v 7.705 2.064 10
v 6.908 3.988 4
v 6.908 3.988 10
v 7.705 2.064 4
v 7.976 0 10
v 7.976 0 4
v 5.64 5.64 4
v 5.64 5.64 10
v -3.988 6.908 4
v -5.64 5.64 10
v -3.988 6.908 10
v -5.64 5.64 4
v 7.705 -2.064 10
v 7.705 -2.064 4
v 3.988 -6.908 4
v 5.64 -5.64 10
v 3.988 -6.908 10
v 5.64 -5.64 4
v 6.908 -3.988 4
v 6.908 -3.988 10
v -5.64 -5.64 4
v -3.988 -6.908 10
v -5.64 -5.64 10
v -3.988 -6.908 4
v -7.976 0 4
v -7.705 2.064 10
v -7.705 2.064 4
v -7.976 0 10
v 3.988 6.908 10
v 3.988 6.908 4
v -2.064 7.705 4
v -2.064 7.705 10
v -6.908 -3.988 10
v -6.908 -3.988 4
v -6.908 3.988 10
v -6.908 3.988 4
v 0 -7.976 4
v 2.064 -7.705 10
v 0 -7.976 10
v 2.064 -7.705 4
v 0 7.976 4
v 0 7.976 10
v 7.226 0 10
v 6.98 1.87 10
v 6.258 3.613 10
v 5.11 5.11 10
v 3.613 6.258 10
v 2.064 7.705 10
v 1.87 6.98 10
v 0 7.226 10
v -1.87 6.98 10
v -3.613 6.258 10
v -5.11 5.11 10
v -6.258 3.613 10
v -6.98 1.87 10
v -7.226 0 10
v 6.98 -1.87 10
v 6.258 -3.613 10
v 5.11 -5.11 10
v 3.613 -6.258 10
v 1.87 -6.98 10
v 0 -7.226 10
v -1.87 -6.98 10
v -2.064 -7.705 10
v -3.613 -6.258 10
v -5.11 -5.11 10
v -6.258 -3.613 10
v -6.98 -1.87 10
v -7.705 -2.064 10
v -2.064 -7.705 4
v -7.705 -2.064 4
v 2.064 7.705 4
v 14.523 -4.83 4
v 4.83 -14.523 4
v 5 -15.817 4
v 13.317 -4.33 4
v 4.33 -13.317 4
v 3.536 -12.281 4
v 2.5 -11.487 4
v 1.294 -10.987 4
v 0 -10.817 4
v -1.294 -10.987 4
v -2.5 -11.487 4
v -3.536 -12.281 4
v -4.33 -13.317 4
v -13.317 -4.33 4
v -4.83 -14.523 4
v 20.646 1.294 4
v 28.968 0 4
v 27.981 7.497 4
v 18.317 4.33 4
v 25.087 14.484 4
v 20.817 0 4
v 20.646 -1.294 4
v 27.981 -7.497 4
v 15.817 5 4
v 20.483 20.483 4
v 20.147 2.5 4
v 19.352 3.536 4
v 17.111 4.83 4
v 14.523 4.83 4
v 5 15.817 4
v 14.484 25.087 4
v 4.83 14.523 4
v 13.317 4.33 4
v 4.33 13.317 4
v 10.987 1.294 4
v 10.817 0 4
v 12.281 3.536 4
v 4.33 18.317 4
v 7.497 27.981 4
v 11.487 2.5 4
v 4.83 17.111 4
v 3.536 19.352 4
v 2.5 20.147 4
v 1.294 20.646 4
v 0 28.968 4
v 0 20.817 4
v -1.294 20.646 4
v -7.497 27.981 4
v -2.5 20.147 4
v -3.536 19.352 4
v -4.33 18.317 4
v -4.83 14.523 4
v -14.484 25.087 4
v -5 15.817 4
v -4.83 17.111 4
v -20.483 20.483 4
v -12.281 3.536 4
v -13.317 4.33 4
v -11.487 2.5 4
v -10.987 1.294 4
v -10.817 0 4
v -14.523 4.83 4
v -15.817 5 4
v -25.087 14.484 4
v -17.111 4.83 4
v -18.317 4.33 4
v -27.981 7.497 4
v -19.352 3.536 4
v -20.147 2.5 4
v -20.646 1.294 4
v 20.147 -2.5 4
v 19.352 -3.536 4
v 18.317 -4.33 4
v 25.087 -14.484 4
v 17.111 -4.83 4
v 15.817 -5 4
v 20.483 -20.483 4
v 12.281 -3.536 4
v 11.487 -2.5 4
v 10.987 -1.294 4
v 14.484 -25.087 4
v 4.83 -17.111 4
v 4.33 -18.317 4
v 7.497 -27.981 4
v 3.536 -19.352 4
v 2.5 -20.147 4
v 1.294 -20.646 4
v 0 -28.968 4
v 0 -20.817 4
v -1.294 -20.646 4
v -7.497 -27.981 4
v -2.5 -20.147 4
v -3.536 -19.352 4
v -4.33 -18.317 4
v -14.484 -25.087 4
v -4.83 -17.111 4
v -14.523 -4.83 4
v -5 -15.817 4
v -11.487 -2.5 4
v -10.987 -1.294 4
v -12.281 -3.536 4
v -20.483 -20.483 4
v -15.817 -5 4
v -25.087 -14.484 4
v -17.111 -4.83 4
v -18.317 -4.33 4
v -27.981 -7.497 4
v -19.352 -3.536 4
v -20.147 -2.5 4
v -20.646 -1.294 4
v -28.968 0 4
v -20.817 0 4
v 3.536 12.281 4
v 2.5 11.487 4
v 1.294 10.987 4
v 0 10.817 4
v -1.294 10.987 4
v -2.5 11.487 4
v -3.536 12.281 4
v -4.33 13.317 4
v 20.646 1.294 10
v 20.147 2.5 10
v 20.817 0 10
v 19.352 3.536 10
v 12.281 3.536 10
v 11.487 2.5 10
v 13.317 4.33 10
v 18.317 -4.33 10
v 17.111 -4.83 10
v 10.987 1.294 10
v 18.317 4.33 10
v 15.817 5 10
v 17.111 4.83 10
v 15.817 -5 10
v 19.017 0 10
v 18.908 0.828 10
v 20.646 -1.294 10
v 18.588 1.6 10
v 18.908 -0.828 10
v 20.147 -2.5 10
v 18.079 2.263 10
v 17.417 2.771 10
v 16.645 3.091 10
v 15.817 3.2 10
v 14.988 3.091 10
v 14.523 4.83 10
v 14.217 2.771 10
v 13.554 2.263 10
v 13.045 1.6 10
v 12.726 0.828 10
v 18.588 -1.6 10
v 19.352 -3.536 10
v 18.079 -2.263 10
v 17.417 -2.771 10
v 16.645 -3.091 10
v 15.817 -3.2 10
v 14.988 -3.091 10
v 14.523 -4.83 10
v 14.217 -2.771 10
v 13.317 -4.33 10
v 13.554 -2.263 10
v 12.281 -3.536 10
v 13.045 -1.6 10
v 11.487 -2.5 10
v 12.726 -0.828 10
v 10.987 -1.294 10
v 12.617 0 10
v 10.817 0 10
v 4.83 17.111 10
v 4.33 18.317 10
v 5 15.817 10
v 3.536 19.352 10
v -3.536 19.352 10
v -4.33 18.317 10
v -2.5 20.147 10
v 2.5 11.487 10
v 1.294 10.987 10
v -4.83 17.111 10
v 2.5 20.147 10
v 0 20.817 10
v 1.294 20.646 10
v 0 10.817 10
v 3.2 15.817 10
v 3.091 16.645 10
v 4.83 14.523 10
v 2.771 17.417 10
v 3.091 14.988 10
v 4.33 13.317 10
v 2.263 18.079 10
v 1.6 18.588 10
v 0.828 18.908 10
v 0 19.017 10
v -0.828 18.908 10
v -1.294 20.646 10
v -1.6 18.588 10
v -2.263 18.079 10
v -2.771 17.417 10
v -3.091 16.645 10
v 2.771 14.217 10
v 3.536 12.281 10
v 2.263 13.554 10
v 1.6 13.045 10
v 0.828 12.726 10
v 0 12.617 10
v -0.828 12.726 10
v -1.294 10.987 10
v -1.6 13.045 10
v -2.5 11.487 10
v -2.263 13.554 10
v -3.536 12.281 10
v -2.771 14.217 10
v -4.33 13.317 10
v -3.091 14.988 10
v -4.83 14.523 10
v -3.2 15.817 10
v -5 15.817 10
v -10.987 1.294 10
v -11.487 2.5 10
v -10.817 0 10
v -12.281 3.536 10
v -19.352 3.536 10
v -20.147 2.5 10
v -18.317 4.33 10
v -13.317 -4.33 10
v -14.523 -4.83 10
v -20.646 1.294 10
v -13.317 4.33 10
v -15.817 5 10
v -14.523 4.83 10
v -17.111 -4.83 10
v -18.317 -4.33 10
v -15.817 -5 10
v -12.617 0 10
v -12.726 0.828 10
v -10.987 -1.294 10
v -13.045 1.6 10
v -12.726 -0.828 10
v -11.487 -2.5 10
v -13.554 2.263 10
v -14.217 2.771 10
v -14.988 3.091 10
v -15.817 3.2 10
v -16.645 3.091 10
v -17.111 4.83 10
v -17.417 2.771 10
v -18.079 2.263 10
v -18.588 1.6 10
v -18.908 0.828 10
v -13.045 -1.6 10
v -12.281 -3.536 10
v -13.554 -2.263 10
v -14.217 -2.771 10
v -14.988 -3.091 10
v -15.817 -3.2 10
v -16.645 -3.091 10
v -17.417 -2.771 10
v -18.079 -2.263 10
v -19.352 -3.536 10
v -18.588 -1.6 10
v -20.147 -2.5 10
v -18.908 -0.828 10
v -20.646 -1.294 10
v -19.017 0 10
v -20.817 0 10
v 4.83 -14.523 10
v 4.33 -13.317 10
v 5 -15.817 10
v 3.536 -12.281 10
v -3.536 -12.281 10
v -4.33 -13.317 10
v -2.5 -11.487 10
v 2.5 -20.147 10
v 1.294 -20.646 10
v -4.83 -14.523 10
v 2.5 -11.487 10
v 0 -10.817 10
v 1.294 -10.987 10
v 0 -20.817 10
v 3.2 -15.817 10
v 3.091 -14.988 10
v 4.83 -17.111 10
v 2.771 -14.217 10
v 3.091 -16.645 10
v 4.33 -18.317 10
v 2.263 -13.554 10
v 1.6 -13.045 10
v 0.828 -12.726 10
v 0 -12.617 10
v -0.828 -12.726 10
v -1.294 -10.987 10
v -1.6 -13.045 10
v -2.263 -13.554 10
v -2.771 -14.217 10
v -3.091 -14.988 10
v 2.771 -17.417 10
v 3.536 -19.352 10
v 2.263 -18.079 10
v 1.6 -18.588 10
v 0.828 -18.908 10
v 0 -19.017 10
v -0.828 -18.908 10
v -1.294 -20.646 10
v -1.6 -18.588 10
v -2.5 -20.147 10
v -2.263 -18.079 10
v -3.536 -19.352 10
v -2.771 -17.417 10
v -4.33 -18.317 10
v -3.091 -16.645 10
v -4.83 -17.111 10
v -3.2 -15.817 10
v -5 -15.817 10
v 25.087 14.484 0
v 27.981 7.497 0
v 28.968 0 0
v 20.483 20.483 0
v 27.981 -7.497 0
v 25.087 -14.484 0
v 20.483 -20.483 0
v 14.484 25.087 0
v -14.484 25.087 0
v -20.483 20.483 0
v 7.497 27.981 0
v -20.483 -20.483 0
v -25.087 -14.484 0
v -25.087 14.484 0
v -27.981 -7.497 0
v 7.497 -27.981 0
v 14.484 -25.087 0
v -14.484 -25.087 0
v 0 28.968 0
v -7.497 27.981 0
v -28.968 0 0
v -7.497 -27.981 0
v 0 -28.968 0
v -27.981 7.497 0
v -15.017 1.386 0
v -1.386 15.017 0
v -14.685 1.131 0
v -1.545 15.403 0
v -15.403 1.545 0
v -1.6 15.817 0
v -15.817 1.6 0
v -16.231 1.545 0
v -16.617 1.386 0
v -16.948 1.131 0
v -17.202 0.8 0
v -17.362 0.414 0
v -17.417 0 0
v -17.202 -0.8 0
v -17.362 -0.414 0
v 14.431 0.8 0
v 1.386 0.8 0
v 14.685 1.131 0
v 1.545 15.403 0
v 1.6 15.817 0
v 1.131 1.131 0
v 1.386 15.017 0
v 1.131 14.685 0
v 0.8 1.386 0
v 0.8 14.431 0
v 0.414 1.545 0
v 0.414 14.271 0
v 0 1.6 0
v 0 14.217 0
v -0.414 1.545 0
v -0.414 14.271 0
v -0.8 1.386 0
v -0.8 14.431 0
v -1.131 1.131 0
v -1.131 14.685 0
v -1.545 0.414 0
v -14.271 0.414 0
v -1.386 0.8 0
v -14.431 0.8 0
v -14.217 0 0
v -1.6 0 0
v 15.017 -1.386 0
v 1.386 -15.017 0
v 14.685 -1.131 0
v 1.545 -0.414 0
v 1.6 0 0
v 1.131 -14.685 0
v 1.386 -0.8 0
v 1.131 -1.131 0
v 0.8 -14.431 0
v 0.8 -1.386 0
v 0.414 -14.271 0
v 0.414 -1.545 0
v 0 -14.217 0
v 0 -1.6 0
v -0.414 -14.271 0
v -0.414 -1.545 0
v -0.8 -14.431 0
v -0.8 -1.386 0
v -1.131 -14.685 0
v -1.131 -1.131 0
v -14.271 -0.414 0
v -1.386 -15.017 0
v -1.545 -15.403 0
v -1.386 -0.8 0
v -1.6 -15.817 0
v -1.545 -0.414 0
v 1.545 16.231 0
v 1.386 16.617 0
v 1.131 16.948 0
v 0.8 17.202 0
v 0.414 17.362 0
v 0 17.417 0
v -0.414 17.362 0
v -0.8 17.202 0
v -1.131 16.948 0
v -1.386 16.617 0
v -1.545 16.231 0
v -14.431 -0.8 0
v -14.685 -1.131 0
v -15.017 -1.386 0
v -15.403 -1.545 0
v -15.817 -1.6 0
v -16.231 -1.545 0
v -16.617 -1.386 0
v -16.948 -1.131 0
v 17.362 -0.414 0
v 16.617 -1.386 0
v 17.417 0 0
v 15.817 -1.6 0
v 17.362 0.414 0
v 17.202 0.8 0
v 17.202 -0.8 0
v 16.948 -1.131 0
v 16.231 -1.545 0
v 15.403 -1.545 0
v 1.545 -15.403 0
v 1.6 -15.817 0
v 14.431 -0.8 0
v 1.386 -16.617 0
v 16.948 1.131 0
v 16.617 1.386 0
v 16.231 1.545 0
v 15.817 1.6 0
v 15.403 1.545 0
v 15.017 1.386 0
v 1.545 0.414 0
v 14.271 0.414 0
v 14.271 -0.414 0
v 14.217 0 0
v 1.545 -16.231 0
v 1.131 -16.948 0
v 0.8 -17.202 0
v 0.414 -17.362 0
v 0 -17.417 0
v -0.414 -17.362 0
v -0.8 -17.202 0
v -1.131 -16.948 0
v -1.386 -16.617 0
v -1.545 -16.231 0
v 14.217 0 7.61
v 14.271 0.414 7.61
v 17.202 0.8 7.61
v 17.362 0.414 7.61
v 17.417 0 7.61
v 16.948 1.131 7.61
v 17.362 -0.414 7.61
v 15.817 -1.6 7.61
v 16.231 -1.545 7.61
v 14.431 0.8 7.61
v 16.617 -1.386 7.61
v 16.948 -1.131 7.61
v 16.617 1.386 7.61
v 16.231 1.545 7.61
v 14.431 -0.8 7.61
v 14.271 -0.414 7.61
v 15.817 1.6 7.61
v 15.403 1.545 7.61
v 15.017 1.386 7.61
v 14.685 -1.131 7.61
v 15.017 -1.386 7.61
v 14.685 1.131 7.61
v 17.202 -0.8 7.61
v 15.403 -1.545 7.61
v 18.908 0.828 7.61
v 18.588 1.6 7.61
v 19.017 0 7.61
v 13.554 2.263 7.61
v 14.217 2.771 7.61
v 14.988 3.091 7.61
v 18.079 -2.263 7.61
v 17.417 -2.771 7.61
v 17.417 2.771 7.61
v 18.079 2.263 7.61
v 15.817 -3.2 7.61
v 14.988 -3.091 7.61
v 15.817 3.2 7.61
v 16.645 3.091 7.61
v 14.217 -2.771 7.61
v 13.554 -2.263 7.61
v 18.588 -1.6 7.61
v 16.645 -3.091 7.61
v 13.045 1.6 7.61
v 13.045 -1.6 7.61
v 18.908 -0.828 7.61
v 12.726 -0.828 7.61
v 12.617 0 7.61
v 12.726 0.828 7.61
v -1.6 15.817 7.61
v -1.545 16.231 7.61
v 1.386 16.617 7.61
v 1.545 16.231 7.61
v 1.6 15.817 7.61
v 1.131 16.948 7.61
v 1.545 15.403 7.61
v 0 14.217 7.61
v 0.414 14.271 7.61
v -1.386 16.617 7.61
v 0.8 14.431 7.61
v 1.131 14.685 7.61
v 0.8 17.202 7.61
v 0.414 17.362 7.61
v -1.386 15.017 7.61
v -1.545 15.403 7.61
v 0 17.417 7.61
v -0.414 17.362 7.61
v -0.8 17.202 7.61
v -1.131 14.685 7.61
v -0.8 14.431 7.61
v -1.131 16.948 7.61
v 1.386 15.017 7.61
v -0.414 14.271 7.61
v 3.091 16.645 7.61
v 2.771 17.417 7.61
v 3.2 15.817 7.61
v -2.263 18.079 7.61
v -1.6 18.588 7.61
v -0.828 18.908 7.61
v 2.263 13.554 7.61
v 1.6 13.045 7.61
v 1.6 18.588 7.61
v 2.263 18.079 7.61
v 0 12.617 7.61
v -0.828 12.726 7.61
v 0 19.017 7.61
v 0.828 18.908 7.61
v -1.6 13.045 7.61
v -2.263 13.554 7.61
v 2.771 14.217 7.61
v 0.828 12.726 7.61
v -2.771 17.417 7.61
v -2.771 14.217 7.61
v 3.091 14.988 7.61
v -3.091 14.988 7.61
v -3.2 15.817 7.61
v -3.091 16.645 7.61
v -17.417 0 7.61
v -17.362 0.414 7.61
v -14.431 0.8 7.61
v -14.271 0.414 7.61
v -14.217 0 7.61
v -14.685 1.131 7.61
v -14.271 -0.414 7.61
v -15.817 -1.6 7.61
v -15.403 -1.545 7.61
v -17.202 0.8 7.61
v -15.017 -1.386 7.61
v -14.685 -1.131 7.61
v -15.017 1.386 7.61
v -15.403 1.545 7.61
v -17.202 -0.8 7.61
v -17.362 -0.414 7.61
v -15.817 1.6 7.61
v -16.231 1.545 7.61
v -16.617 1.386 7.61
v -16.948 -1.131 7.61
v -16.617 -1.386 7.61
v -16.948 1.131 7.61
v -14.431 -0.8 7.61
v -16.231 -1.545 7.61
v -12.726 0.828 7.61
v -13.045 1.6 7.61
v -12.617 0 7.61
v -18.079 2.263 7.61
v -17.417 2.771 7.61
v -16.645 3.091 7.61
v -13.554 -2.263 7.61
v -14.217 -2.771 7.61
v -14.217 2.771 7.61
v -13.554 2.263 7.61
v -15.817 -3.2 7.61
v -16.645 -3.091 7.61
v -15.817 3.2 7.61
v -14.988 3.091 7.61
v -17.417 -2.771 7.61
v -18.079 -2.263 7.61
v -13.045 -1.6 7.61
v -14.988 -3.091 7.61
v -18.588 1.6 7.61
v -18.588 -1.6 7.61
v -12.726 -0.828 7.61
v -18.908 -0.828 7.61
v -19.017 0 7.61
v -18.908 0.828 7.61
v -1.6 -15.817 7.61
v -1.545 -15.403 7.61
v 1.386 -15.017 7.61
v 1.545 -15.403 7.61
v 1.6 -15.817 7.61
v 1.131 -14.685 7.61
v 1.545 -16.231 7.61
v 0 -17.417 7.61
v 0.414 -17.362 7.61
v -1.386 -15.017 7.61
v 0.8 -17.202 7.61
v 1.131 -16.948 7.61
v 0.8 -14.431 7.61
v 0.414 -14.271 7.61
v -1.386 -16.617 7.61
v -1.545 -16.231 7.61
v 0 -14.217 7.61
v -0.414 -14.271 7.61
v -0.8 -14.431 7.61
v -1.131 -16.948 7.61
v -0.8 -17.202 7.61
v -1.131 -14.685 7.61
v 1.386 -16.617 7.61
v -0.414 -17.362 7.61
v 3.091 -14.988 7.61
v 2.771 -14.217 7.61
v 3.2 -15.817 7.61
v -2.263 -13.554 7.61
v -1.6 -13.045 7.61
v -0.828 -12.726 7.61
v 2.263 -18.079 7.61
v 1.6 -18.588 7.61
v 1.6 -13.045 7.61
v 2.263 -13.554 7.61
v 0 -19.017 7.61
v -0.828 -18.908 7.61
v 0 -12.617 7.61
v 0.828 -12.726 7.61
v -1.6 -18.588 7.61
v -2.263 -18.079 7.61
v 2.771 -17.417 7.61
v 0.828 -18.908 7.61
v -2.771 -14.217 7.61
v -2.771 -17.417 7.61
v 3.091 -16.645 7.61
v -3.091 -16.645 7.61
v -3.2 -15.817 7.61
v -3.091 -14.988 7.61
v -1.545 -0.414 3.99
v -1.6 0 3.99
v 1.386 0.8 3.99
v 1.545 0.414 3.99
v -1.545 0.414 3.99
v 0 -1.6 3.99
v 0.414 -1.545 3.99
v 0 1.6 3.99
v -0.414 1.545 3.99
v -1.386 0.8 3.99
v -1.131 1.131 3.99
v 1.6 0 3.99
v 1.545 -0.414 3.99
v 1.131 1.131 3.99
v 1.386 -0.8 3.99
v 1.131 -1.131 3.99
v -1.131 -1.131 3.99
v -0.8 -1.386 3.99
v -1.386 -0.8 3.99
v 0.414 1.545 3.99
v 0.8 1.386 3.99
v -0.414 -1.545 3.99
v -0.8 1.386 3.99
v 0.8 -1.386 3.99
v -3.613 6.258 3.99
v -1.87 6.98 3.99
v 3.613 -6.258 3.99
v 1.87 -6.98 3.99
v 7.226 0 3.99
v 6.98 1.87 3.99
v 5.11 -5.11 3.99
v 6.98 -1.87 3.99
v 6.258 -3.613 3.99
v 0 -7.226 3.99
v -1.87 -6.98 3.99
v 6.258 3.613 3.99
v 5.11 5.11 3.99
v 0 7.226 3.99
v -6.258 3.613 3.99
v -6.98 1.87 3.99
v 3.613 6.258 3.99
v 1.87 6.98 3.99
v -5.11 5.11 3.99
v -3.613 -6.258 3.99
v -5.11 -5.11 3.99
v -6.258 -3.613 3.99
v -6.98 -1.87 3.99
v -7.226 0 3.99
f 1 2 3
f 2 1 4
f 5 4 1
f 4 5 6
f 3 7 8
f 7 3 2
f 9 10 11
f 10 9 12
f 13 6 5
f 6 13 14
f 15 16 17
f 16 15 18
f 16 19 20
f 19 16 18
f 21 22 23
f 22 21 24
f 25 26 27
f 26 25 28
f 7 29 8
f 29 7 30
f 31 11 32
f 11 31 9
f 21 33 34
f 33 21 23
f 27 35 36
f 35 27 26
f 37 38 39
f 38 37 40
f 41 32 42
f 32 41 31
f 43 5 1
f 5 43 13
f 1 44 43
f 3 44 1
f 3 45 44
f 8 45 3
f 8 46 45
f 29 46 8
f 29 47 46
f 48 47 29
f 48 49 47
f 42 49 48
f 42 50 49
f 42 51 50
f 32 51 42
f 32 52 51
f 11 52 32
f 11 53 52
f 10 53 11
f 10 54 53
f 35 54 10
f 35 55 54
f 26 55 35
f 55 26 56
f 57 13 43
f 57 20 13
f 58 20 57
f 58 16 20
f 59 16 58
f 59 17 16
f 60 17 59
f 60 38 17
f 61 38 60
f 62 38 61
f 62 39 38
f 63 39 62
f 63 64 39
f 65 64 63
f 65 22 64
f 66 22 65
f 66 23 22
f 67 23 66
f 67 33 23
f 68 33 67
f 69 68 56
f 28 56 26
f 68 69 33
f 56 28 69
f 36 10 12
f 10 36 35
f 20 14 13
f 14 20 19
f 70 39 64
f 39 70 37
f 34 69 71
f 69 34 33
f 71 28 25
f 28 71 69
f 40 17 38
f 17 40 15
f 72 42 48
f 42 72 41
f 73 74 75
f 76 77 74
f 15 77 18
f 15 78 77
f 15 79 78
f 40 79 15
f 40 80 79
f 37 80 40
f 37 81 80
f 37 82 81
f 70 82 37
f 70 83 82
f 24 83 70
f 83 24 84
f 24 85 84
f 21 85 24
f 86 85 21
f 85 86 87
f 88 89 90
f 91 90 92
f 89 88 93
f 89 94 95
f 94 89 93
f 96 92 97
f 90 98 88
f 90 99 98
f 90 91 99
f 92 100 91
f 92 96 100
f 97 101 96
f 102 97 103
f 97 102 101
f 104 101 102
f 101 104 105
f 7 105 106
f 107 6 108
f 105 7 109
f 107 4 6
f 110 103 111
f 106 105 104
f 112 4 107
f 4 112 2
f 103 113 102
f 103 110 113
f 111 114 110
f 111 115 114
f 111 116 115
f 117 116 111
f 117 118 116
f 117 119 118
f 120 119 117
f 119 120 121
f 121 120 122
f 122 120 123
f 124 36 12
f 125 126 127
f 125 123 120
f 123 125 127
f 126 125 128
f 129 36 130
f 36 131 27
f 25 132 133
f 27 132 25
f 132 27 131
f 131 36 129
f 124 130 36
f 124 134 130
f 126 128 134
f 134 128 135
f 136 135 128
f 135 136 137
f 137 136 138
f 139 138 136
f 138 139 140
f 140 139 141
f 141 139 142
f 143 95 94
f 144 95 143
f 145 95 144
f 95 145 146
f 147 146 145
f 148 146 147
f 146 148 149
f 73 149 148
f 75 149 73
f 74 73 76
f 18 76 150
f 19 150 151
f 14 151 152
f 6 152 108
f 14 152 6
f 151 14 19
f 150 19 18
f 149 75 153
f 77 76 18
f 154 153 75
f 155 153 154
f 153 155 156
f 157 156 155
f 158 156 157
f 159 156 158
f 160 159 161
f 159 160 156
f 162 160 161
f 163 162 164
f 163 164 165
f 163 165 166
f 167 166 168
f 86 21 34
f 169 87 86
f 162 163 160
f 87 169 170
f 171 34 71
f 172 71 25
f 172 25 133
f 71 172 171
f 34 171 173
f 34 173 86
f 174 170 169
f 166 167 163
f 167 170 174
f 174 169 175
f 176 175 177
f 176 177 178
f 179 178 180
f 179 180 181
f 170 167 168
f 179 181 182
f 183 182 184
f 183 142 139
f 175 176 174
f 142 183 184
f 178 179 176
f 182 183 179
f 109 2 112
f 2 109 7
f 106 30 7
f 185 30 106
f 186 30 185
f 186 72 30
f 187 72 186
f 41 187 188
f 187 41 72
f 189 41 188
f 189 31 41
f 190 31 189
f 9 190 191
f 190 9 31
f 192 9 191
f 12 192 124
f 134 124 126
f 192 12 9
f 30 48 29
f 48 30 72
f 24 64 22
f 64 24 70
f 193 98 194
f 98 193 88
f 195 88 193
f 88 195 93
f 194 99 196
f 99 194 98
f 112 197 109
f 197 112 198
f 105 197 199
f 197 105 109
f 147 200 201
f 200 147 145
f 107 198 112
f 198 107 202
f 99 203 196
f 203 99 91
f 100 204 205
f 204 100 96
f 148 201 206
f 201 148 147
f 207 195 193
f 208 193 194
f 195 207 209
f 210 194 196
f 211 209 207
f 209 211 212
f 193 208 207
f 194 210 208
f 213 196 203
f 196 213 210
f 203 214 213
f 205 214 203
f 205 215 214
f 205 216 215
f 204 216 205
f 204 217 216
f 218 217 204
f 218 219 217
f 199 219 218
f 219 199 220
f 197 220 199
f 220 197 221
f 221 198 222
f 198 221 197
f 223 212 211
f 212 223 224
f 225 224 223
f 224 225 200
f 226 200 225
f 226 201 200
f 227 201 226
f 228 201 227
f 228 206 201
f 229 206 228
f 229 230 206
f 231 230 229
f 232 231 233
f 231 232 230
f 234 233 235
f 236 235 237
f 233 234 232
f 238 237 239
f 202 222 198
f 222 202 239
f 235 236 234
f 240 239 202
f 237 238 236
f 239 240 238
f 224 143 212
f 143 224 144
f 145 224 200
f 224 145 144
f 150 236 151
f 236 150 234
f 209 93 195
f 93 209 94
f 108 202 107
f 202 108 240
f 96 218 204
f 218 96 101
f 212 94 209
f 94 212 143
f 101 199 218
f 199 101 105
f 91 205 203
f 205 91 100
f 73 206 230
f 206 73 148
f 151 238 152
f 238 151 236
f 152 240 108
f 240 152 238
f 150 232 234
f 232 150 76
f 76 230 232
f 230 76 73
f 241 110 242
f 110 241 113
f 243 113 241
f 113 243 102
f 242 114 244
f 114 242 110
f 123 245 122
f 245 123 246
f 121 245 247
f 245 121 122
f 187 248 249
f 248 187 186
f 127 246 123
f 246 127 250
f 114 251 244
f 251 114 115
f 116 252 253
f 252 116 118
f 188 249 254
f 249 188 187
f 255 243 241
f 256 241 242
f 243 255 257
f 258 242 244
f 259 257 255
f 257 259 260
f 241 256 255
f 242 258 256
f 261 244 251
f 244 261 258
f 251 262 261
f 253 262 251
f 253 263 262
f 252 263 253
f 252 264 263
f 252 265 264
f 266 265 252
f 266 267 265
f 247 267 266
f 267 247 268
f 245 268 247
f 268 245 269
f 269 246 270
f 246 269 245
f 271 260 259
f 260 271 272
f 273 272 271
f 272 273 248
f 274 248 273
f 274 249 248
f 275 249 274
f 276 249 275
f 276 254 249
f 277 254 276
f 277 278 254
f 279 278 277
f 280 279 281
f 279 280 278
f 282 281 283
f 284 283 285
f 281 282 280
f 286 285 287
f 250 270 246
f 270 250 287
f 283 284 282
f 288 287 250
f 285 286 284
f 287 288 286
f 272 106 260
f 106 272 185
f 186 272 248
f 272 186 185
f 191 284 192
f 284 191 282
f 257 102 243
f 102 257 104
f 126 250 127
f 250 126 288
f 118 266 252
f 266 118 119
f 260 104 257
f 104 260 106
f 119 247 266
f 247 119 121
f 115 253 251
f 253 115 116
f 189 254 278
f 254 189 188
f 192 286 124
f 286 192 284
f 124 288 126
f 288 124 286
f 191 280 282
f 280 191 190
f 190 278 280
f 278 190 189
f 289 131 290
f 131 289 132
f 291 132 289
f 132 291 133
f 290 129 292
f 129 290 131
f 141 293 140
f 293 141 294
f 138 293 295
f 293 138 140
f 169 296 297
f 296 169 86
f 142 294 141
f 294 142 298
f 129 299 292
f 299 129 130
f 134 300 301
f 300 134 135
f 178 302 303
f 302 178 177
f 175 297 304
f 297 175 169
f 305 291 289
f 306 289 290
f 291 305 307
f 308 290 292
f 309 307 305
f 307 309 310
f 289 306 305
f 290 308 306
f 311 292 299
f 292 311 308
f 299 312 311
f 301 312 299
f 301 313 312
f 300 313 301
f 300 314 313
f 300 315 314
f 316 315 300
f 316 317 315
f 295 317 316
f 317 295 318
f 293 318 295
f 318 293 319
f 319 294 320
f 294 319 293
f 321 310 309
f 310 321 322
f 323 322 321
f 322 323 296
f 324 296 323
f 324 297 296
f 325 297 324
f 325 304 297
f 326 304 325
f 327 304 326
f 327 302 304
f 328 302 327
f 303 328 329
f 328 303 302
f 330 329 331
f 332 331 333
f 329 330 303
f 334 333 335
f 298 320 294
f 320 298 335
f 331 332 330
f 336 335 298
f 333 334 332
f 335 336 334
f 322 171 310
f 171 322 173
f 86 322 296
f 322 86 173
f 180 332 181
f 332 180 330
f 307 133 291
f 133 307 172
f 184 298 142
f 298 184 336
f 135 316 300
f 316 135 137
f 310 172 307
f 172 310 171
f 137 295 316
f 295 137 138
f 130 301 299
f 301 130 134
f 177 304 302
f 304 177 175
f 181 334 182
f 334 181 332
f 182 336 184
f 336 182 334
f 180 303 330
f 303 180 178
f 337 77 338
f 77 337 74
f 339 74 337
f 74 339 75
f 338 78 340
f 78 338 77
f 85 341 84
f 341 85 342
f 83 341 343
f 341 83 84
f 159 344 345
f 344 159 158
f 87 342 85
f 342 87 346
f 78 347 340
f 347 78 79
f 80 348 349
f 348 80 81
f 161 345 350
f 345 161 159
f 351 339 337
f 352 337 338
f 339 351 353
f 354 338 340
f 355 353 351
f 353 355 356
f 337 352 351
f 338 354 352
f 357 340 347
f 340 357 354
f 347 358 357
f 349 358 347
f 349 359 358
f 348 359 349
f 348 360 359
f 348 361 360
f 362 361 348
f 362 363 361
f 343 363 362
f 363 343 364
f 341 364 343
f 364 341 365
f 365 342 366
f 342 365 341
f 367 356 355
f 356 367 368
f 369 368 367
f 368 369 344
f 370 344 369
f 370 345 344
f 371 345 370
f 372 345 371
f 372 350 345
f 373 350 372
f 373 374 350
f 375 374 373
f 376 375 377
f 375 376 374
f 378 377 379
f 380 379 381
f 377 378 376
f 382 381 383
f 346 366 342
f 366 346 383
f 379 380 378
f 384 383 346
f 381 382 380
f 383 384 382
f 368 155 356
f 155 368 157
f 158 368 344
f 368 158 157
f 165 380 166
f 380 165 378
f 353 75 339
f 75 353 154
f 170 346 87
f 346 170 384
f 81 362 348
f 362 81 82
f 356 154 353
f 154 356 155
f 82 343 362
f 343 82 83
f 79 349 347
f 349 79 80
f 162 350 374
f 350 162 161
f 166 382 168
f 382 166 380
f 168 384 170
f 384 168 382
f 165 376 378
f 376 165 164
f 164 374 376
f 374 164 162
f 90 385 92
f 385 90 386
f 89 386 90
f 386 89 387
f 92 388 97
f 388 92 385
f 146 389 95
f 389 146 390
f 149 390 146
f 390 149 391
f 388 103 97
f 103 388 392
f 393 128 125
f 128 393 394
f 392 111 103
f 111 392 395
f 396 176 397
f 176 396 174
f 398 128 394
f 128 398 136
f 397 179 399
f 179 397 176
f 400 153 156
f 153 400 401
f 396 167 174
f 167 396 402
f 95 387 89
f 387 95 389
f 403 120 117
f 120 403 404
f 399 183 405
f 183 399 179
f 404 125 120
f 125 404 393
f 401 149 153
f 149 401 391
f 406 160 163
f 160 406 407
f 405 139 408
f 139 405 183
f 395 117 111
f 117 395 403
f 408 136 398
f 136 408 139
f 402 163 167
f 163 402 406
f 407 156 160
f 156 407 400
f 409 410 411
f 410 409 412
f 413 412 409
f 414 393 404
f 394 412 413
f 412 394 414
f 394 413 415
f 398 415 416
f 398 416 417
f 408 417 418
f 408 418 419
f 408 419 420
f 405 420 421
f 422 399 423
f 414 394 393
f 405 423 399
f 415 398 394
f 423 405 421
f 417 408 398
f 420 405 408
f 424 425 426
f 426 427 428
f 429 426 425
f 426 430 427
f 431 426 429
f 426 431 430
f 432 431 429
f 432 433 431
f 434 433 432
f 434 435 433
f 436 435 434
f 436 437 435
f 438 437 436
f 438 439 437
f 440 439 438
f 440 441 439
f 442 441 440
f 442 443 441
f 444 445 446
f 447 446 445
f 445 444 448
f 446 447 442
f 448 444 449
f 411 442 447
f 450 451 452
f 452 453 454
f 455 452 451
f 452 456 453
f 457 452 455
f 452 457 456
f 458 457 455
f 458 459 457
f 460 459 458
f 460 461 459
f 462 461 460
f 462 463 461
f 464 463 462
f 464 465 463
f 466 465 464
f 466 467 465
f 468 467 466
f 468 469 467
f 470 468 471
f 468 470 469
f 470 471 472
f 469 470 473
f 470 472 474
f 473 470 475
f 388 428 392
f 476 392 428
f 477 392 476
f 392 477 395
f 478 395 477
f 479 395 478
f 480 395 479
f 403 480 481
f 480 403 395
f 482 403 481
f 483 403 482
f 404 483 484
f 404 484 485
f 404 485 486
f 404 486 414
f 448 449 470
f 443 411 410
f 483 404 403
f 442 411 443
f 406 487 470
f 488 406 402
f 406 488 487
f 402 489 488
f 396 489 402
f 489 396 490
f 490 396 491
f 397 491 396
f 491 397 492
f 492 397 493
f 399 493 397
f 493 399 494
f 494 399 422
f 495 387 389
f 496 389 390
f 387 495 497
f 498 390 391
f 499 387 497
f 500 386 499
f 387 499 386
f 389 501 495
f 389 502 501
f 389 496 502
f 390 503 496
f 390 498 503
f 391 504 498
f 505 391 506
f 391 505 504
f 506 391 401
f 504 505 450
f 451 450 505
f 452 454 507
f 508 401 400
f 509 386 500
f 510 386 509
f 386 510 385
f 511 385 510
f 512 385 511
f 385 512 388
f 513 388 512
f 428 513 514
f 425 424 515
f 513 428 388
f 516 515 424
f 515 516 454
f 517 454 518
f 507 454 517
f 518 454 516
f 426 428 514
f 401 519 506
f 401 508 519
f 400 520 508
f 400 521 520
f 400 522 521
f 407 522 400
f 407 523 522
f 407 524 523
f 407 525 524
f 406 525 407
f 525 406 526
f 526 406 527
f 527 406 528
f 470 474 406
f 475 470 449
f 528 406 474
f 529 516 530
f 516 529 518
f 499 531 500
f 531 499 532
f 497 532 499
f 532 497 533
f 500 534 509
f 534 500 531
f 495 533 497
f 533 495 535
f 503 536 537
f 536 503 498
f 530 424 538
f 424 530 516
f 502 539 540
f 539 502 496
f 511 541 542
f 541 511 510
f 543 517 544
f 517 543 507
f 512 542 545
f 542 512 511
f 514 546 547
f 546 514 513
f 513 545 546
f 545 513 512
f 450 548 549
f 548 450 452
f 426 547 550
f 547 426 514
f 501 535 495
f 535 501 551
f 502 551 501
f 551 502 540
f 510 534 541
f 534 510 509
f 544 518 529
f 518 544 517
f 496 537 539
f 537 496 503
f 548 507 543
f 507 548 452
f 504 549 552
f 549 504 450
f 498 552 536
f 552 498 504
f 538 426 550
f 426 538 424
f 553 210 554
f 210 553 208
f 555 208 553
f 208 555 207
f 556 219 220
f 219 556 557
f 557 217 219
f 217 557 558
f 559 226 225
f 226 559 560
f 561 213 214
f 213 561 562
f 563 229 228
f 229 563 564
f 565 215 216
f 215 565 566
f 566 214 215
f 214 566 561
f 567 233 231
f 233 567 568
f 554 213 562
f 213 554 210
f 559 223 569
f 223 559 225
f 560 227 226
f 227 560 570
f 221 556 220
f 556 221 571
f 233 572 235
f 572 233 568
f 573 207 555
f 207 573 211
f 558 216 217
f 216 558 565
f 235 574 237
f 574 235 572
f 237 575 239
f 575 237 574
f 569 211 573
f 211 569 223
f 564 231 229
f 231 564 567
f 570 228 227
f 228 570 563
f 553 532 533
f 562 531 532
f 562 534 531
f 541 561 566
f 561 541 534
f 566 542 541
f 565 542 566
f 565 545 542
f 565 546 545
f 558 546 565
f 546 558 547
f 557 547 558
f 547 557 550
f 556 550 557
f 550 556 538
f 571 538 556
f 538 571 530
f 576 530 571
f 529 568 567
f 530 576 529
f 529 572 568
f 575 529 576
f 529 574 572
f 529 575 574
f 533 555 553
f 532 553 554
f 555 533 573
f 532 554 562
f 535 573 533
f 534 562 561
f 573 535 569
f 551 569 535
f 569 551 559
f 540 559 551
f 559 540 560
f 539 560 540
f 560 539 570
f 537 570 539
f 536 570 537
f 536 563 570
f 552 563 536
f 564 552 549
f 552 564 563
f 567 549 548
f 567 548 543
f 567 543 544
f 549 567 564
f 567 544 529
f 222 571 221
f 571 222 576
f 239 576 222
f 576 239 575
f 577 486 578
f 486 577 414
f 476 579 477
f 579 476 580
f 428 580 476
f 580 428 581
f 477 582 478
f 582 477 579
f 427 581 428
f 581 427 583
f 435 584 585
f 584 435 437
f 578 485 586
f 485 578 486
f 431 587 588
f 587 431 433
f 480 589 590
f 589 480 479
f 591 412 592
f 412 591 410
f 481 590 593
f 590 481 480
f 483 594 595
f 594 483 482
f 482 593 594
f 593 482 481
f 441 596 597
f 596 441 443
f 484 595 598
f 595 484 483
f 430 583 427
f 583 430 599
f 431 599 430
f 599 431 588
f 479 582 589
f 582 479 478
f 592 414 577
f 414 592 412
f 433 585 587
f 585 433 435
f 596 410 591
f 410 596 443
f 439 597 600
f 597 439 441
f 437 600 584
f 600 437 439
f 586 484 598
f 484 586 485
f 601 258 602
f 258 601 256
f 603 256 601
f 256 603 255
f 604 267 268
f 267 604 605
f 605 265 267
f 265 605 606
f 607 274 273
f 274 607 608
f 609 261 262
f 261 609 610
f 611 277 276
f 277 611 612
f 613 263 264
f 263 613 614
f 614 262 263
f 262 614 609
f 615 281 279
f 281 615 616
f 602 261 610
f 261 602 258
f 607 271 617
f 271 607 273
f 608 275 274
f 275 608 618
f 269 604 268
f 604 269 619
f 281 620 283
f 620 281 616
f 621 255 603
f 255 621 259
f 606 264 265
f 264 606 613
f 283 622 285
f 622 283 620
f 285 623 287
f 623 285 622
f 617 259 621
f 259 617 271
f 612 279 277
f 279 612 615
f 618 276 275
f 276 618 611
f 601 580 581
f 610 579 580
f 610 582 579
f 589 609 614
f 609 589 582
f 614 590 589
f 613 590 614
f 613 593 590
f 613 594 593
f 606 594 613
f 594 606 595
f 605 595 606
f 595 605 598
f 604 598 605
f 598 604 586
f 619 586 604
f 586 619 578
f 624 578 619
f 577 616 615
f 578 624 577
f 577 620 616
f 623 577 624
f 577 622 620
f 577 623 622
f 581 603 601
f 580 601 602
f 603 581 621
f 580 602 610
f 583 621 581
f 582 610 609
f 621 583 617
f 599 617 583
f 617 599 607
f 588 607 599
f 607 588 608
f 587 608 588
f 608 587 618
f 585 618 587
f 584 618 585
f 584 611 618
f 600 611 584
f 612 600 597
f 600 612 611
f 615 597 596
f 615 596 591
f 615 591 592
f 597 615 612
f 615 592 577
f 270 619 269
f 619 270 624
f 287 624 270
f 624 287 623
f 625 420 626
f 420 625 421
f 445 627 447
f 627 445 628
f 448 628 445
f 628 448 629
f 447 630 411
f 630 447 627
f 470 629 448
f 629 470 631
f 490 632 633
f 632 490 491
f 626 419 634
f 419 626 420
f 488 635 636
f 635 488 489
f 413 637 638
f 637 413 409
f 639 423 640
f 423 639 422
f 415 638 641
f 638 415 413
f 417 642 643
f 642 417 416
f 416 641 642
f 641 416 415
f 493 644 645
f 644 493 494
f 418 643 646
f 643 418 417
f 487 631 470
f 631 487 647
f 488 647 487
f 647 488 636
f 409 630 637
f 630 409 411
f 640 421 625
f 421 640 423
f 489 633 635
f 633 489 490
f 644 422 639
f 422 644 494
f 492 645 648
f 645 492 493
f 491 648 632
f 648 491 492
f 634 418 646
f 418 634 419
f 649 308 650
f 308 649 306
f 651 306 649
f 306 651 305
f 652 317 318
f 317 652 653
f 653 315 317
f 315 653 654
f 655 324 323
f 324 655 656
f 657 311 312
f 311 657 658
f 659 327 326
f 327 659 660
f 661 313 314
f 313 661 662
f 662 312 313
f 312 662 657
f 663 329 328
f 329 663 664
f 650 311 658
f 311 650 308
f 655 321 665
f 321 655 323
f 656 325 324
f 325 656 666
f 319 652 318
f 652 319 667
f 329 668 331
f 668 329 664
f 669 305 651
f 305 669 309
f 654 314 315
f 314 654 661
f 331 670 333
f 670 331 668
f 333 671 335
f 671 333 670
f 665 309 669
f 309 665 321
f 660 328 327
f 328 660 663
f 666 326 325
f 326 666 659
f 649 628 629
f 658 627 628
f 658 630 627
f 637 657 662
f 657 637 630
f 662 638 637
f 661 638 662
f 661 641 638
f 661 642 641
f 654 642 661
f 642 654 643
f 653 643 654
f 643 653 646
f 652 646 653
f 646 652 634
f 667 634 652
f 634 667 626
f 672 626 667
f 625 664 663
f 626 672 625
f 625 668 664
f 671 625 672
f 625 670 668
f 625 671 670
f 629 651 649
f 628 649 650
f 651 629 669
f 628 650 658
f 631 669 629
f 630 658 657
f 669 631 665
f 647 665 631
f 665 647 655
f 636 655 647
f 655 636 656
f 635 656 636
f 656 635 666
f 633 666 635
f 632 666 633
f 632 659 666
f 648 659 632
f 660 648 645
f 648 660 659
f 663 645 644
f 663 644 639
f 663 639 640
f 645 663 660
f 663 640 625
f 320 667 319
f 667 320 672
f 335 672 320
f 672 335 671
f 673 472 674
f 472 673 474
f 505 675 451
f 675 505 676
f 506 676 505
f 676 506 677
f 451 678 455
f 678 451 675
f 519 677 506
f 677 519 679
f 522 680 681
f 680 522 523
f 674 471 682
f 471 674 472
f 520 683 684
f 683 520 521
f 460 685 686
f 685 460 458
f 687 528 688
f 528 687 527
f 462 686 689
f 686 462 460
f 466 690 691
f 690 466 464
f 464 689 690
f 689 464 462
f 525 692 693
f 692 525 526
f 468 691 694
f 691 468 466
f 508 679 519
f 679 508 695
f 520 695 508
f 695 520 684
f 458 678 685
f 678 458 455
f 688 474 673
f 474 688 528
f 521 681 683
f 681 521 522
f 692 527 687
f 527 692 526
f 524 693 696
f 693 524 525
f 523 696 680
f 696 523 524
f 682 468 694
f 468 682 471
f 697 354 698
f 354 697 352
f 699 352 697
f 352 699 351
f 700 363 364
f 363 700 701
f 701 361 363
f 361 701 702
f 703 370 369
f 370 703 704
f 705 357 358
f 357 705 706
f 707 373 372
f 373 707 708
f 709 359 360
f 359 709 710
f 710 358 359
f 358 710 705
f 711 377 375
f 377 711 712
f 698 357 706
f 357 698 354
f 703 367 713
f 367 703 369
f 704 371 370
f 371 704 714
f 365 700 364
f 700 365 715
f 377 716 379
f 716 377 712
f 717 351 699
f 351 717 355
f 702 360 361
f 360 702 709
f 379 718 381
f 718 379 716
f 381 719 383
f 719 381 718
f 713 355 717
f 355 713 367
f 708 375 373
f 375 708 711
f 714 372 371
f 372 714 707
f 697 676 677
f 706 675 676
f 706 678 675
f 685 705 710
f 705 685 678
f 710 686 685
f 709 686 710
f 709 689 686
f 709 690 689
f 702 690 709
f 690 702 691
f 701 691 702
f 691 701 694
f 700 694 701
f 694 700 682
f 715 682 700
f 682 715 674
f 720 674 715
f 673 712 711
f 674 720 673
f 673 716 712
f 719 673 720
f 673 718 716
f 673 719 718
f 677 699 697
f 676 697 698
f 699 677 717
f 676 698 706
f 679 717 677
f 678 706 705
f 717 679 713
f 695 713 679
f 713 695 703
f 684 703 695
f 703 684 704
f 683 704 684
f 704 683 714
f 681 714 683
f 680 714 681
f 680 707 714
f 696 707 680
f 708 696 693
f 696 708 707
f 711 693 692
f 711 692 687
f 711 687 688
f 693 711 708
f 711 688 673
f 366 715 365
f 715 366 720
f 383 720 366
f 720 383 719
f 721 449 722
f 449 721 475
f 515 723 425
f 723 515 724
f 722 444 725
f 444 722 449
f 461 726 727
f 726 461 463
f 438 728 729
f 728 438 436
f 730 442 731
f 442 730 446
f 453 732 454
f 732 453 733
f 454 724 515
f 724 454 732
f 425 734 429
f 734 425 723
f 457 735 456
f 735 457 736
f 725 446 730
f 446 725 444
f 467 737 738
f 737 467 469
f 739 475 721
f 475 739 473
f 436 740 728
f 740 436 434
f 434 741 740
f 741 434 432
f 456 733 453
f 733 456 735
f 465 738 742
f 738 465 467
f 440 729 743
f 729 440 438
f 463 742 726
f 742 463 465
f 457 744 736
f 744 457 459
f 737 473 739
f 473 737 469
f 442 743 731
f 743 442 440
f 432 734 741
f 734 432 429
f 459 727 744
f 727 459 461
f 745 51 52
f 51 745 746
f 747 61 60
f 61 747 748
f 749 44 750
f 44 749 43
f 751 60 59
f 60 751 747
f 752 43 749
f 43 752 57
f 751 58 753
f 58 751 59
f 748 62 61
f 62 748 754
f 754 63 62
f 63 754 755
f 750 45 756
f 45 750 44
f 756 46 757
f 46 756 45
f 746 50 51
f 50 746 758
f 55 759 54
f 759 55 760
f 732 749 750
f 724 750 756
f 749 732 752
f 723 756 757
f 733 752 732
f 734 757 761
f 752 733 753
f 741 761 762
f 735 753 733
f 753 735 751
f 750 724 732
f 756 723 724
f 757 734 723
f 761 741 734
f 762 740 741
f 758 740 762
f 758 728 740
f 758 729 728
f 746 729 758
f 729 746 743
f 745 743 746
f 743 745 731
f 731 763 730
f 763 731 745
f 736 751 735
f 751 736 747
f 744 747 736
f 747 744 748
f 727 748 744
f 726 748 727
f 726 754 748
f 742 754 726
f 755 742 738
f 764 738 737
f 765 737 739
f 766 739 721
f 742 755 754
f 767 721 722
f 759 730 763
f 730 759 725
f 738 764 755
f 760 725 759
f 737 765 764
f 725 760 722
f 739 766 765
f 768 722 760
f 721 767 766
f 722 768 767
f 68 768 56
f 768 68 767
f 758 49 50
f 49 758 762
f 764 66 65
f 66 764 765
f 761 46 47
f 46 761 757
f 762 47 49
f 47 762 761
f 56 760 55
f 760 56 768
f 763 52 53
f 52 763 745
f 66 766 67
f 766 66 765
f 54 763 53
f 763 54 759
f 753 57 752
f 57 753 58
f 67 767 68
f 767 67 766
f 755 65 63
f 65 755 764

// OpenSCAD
//====================================================
// Печатная оснастка для геликальной антенны (спираль не выводится)
// DEV версия v14
//====================================================
// Задача: печатные детали для сборки axial-mode геликальной антенны:
// - Труба для намотки (опционально канавка-ориентир; спираль не печатается)
// - Шаблон для сверления/резки рефлектора (опционально)
// - Крепёж из 2 деталей: (A) площадка под трубу с кольцом и стойками, (B) крепление к плоскости с 4 ушами
// - Посадка под SMA на квадратной площадке со стороны рефлектора
// - Опциональный кондуктор для гибки дельта-матча (сам дельта-матч — проволока)
//
// Единицы: миллиметры
//====================================================

/* [Быстрый экспорт] */
export_part = "plate"; // [assembly,tube,tube_section,plate,wall_mount,reflector_template,delta_jig] (что вывести/экспортировать)

/* [РЧ параметры] */
freq_mhz = 5800;          // Рабочая частота (МГц)
target_gain_dbi = 12;     // Только для расчёта длины трубы (спираль не выводится)
polarization = "RHCP";    // [RHCP,LHCP] (ориентир: RHCP/LHCP)

/* [Геометрия спирали (только для расчёта трубы)] */
circumference_factor = 1.00;  // C ≈ 1.0*λ (старт для axial-mode)
pitch_factor = 0.25;          // S ≈ 0.25*λ (старт для axial-mode)
min_turns = 5.5;
max_turns = 14;

/* [Проволока и согласование (дельта-матч)] */
wire_d = 1.2;                 // Диаметр проволоки (мм)
wire_material = "CuAlloy";    // [CuAlloy,Brass,Al] (потери разные; геометрия важнее для согласования)
delta_mode = "auto";          // [auto,manual] auto=авторасчёт, manual=вручную
delta_base_manual = 0;        // мм (0 = игнорировать)
delta_height_manual = 0;      // мм (0 = игнорировать)
delta_tap_manual = 0;         // мм от "заземлённого" конца по стороне треугольника (0 = игнорировать)

/* [Труба намотки] */
tube_wall = 2.0;              // mm
tube_clearance = 0.25;        // мм (посадка на кольцо)
tube_groove_enable = true;    // делать направляющую канавку (для ровной укладки проволоки)

groove_segments_per_turn = 24; // Кол-во сегментов канавки на один виток (выше = ровнее, но медленнее)

tube_groove_depth = 0.5;      // мм (глубина канавки в трубе)
tube_groove_width = 1.2;      // mm
tube_sections = 3;            // кол-во секций трубы для печати
tube_section_gap = 0.25;      // мм зазор между секциями (допуск сборки)
export_section = 0;           // какую секцию экспортировать при export_part="tube_section"

/* [Площадка под трубу (деталь A)] */
plate_thickness = 4.0;        // mm
plate_od_extra = 14;          // мм запас за край рефлектора для прочности
spigot_height = 6.0;          // mm
standoff_count = 4;
standoff_d = 10.0;            // мм (наружный диаметр)
standoff_h = 6.0;             // мм (высота над площадкой)
clamp_screw_d = 3.2;          // мм проход под M3 (поменяй под свой крепёж)
clamp_screw_head_d = 6.4;     // опциональная выборка под шляпку
clamp_screw_head_h = 2.4;

/* [Крепление к плоскости (деталь B)] */
wall_block_thickness = 5.0;   // мм (по твоему ТЗ)
wall_block_xy = 28;           // мм габарит опорного блока (примерно квадрат)
lug_length = 10;              // mm
lug_width = 10;               // mm
lug_hole_d = 5.0;             // мм (по твоему ТЗ)
lug_pair_gap = 10;            // мм расстояние между двумя ушами на одной стороне

/* [Шаблон рефлектора] */
reflector_mode = "auto";      // [auto,manual] auto=авто, manual=вручную
reflector_d_manual = 120;     // мм если manual
reflector_thickness_template = 1.0;  // мм (только шаблон; реальный рефлектор обычно из металла)

/* [Разъём SMA на площадке] */
// Твой SMA: квадрат ~12.6 мм, отверстия по углам ~8 мм (центр-центр) ~8mm (center-to-center)
sma_flange_side = 12.6;       // мм (сторона квадратной площадки)
sma_hole_spacing = 8.0;       // mm (center-to-center)
sma_flange_hole_d = 2.4;      // мм (под винтики разъёма)
sma_center_hole_d = 6.6;      // мм (отверстие под тело разъёма)
sma_offset_r = 0;             // мм смещение от центра (0 = по центру)

/* [Качество рендера] */
preview_mode = true;         // Быстрый режим для превью (резко ускоряет первый рендер)
render_preset = "normal";    // [fast,normal,pretty] fast=быстро, normal=нормально, pretty=красиво

// Внутренняя настройка качества (не трогай, если не нужно)
$fn = (preview_mode || render_preset=="fast") ? 24 :
      (render_preset=="pretty" ? 96 : 48);


//====================================================
// Derived values
//====================================================
function clamp(x, a, b) = x < a ? a : (x > b ? b : x);

// Speed of light (mm/s)
c_mm_s = 299792458000;
freq_hz = freq_mhz * 1e6;
lambda_mm = c_mm_s / freq_hz;

// Axial-mode starting values (tube sizing only)
circ_mm = lambda_mm * circumference_factor;
tube_od = circ_mm / PI;
pitch_mm = lambda_mm * pitch_factor;

// Tube length sizing by gain rule-of-thumb
turns_raw = pow(10, (target_gain_dbi - 5.4)/10);
turns = clamp(turns_raw, min_turns, max_turns);
tube_len = turns * pitch_mm;

// Reflector diameter (auto start)
reflector_d_auto = lambda_mm * 0.85;
reflector_d = (reflector_mode == "manual") ? reflector_d_manual : reflector_d_auto;

// Plate OD: slightly larger than reflector
plate_od = reflector_d + plate_od_extra;

// Spigot geometry: tube slips OVER spigot
tube_id = tube_od - 2*tube_wall;
spigot_od = tube_id - 2*tube_clearance;
spigot_id = max(0.1, spigot_od - 2.4);

// Standoff circle radius
standoff_r = (reflector_d/2) * 0.72;

//====================================================
// Delta-match "auto" starting geometry
//====================================================
// Starting point (empirical): base ~0.18λ, height ~0.10λ, tap ~45% of height.
// Material mostly affects loss (Q); geometry dominates match.
// Expect tuning in the real build.
mat_k = (wire_material == "Brass") ? 0.995 : (wire_material == "Al") ? 0.990 : 1.000;
wd_k = 1.0 - clamp((wire_d - 1.0) * 0.002, -0.02, 0.02);

delta_base_auto = lambda_mm * 0.18 * mat_k * wd_k;
delta_height_auto = lambda_mm * 0.10 * mat_k * wd_k;
delta_tap_auto = delta_height_auto * 0.45;

delta_base = (delta_mode == "manual" && delta_base_manual > 0) ? delta_base_manual : delta_base_auto;
delta_height = (delta_mode == "manual" && delta_height_manual > 0) ? delta_height_manual : delta_height_auto;
delta_tap = (delta_mode == "manual" && delta_tap_manual > 0) ? delta_tap_manual : delta_tap_auto;

// Print computed values in OpenSCAD console
echo("==== Helical Antenna v13 (mechanical parts only) ====");
echo("freq_mhz=", freq_mhz, " lambda_mm=", lambda_mm);
echo("tube_od(mm)=", tube_od, " tube_len(mm)=", tube_len, " pitch(mm)=", pitch_mm, " turns=", turns);
echo("reflector_d(mm)=", reflector_d);
echo("Delta-match (start) base(mm)=", delta_base, " height(mm)=", delta_height, " tap(mm)=", delta_tap);
echo("Polarization=", polarization);

//====================================================
// Modules
//====================================================

module drill_hole(d, h, cbore_d=0, cbore_h=0) {
    cylinder(d=d, h=h, center=false);
    if (cbore_d > 0 && cbore_h > 0)
        translate([0,0,h-cbore_h]) cylinder(d=cbore_d, h=cbore_h, center=false);
}


// Быстрый "стержень" между двумя точками (для канавки). Нам достаточно цилиндра.
module rod_between(p0, p1, d) {
    v = [p1[0]-p0[0], p1[1]-p0[1], p1[2]-p0[2]];
    h = norm(v);
    if (h > 0) {
        // Ось Z -> вектор v (быстро, без hull/sphere)
        ax = cross([0,0,1], v);
        axn = norm(ax);
        ang = acos(v[2] / h);

        translate(p0) {
            if (axn < 1e-9) {
                cylinder(d=d, h=h, center=false);
            } else {
                rotate(a=ang, v=ax) cylinder(d=d, h=h, center=false);
            }
        }
    }
}

module sma_flange_holes(th) {
    for (sx=[-1,1], sy=[-1,1]) {
        translate([sx*sma_hole_spacing/2, sy*sma_hole_spacing/2, 0])
            cylinder(d=sma_flange_hole_d, h=th, center=false);
    }
}

module sma_center_hole(th) {
    cylinder(d=sma_center_hole_d, h=th, center=false);
}

module plate_part() {
    // Part A: plate + spigot + standoffs
    difference() {
        union() {
            cylinder(d=plate_od, h=plate_thickness);

            translate([0,0,plate_thickness])
                difference() {
                    cylinder(d=spigot_od + 4.0, h=spigot_height);
                    translate([0,0,-0.01]) cylinder(d=spigot_od, h=spigot_height+0.02);
                }

            for (i=[0:standoff_count-1]) {
                ang = 360*i/standoff_count;
                translate([standoff_r*cos(ang), standoff_r*sin(ang), plate_thickness])
                    cylinder(d=standoff_d, h=standoff_h);
            }
        }

        // Central clamp screw
        translate([0,0,-0.01])
            cylinder(d=clamp_screw_d, h=plate_thickness+spigot_height+standoff_h+0.02);

        // Clamp holes in standoffs
        for (i=[0:standoff_count-1]) {
            ang = 360*i/standoff_count;
            translate([standoff_r*cos(ang), standoff_r*sin(ang), -0.01])
                drill_hole(clamp_screw_d, plate_thickness+standoff_h+0.02, clamp_screw_head_d, clamp_screw_head_h);
        }

        // Tube inner clearance
        translate([0,0,plate_thickness-0.01])
            cylinder(d=tube_id + 2.0, h=spigot_height+standoff_h+0.02);
    }
}

module wall_mount_part() {
    // Part B: wall/plane mount block with 4 lugs (Ø5 holes) + clamp holes aligned to standoffs
    difference() {
        union() {
            translate([-wall_block_xy/2, -wall_block_xy/2, 0])
                cube([wall_block_xy, wall_block_xy, wall_block_thickness]);

            // Two lugs on +Y side
            for (k=[-1,1]) {
                translate([k*(lug_pair_gap/2), wall_block_xy/2, 0])
                    translate([-lug_width/2, 0, 0])
                        cube([lug_width, lug_length, wall_block_thickness]);
            }
            // Two lugs on -Y side
            for (k=[-1,1]) {
                translate([k*(lug_pair_gap/2), -wall_block_xy/2 - lug_length, 0])
                    translate([-lug_width/2, 0, 0])
                        cube([lug_width, lug_length, wall_block_thickness]);
            }
        }

        // Four Ø5 through-holes in lugs
        for (side=[1,-1]) for (k=[-1,1]) {
            y0 = (side==1) ? (wall_block_xy/2 + lug_length/2) : (-wall_block_xy/2 - lug_length/2);
            translate([k*(lug_pair_gap/2), y0, -0.01])
                cylinder(d=lug_hole_d, h=wall_block_thickness+0.02);
        }

        // Clamp-screw clearance holes aligned with plate standoffs
        for (i=[0:standoff_count-1]) {
            ang = 360*i/standoff_count;
            translate([standoff_r*cos(ang), standoff_r*sin(ang), -0.01])
                cylinder(d=clamp_screw_d, h=wall_block_thickness+0.02);
        }

        // Central clamp screw
        translate([0,0,-0.01])
            cylinder(d=clamp_screw_d, h=wall_block_thickness+0.02);
    }
}

module reflector_template() {
    // Optional: printable drilling/cutting template for your metal reflector.
    difference() {
        cylinder(d=reflector_d, h=reflector_thickness_template);

        // Clamp holes
        for (i=[0:standoff_count-1]) {
            ang = 360*i/standoff_count;
            translate([standoff_r*cos(ang), standoff_r*sin(ang), -0.01])
                cylinder(d=clamp_screw_d, h=reflector_thickness_template+0.02);
        }

        // Central clamp hole
        translate([0,0,-0.01]) cylinder(d=clamp_screw_d, h=reflector_thickness_template+0.02);

        // SMA footprint
        translate([sma_offset_r,0,-0.01]) {
            sma_center_hole(reflector_thickness_template+0.02);
            sma_flange_holes(reflector_thickness_template+0.02);
        }
    }
}

module tube_single() {
    // Труба с опциональной неглубокой канавкой-ориентиром (спираль не печатается)
    difference() {
        // Outer tube
        cylinder(d=tube_od, h=tube_len);

        // Inner bore
        translate([0,0,-0.01]) cylinder(d=tube_id, h=tube_len+0.02);

        // Shallow guide groove cutter (biting only tube_groove_depth)
        if (tube_groove_enable) {
            // В превью резко снижаем детализацию, иначе OpenSCAD будет "умирать"
            seg_per_turn = (preview_mode || render_preset=="fast") ? max(8, floor(groove_segments_per_turn/3)) : groove_segments_per_turn;
            steps = max( max(24, ceil(turns*seg_per_turn)), ceil(tube_len/2) );
            r_cut = tube_od/2 - tube_groove_depth/2;

            for (i=[0:steps-1]) {
                t0 = i/steps;
                t1 = (i+1)/steps;
                z0 = t0*tube_len;
                z1 = t1*tube_len;
                a0 = 360*turns*t0 * ((polarization=="RHCP") ? 1 : -1);
                a1 = 360*turns*t1 * ((polarization=="RHCP") ? 1 : -1);

                p0 = [r_cut*cos(a0), r_cut*sin(a0), z0];
                p1 = [r_cut*cos(a1), r_cut*sin(a1), z1];
                rod_between(p0, p1, tube_groove_width);
            }
        }
    }
}

module tube_section(idx=0) {
    seg_len = (tube_len - (tube_sections-1)*tube_section_gap) / tube_sections;
    z0 = idx*(seg_len + tube_section_gap);

    // Move section to origin for export convenience
    translate([0,0,-z0])
        intersection() {
            tube_single();
            translate([-tube_od, -tube_od, z0])
                cube([2*tube_od, 2*tube_od, seg_len]);
        }
}

module delta_match_jig() {
    // A flat jig to bend the delta-match wire to the computed triangle.
    base_th = 4;
    peg_h = 8;
    peg_d = max(wire_d*2.2, 3.5);

    pA = [0, 0];                 // grounded end
    pB = [delta_base, 0];        // helix end (on first turn)
    pC = [0, delta_height];      // apex
    pT = [0, delta_tap];         // tap point on A->C

    pad = 10;
    w = delta_base + pad*2;
    h = delta_height + pad*2;

    translate([-pad, -pad, 0]) cube([w, h, base_th]);

    for (p=[pA,pB,pC,pT]) {
        translate([p[0], p[1], base_th])
            cylinder(d=peg_d, h=peg_h);
    }
}

module assembly() {
    // Stack view (bottom -> top): wall_mount -> reflector template (hover) -> plate -> tube
    wall_mount_part();

    // template hovering for reference
    translate([0,0,wall_block_thickness + 0.2])
        reflector_template();

    translate([0,0,wall_block_thickness + 0.2 + reflector_thickness_template + 0.2])
        plate_part();

    translate([0,0,wall_block_thickness + 0.2 + reflector_thickness_template + 0.2 + plate_thickness])
        tube_single();
}

//====================================================
// Main switch
//====================================================
if (export_part == "assembly") {
    assembly();
} else if (export_part == "tube") {
    tube_single();
} else if (export_part == "tube_section") {
    tube_section(export_section);
} else if (export_part == "plate") {
    plate_part();
} else if (export_part == "wall_mount") {
    wall_mount_part();
} else if (export_part == "reflector_template") {
    reflector_template();
} else if (export_part == "delta_jig") {
    delta_match_jig();
} else {
    assembly();
}
